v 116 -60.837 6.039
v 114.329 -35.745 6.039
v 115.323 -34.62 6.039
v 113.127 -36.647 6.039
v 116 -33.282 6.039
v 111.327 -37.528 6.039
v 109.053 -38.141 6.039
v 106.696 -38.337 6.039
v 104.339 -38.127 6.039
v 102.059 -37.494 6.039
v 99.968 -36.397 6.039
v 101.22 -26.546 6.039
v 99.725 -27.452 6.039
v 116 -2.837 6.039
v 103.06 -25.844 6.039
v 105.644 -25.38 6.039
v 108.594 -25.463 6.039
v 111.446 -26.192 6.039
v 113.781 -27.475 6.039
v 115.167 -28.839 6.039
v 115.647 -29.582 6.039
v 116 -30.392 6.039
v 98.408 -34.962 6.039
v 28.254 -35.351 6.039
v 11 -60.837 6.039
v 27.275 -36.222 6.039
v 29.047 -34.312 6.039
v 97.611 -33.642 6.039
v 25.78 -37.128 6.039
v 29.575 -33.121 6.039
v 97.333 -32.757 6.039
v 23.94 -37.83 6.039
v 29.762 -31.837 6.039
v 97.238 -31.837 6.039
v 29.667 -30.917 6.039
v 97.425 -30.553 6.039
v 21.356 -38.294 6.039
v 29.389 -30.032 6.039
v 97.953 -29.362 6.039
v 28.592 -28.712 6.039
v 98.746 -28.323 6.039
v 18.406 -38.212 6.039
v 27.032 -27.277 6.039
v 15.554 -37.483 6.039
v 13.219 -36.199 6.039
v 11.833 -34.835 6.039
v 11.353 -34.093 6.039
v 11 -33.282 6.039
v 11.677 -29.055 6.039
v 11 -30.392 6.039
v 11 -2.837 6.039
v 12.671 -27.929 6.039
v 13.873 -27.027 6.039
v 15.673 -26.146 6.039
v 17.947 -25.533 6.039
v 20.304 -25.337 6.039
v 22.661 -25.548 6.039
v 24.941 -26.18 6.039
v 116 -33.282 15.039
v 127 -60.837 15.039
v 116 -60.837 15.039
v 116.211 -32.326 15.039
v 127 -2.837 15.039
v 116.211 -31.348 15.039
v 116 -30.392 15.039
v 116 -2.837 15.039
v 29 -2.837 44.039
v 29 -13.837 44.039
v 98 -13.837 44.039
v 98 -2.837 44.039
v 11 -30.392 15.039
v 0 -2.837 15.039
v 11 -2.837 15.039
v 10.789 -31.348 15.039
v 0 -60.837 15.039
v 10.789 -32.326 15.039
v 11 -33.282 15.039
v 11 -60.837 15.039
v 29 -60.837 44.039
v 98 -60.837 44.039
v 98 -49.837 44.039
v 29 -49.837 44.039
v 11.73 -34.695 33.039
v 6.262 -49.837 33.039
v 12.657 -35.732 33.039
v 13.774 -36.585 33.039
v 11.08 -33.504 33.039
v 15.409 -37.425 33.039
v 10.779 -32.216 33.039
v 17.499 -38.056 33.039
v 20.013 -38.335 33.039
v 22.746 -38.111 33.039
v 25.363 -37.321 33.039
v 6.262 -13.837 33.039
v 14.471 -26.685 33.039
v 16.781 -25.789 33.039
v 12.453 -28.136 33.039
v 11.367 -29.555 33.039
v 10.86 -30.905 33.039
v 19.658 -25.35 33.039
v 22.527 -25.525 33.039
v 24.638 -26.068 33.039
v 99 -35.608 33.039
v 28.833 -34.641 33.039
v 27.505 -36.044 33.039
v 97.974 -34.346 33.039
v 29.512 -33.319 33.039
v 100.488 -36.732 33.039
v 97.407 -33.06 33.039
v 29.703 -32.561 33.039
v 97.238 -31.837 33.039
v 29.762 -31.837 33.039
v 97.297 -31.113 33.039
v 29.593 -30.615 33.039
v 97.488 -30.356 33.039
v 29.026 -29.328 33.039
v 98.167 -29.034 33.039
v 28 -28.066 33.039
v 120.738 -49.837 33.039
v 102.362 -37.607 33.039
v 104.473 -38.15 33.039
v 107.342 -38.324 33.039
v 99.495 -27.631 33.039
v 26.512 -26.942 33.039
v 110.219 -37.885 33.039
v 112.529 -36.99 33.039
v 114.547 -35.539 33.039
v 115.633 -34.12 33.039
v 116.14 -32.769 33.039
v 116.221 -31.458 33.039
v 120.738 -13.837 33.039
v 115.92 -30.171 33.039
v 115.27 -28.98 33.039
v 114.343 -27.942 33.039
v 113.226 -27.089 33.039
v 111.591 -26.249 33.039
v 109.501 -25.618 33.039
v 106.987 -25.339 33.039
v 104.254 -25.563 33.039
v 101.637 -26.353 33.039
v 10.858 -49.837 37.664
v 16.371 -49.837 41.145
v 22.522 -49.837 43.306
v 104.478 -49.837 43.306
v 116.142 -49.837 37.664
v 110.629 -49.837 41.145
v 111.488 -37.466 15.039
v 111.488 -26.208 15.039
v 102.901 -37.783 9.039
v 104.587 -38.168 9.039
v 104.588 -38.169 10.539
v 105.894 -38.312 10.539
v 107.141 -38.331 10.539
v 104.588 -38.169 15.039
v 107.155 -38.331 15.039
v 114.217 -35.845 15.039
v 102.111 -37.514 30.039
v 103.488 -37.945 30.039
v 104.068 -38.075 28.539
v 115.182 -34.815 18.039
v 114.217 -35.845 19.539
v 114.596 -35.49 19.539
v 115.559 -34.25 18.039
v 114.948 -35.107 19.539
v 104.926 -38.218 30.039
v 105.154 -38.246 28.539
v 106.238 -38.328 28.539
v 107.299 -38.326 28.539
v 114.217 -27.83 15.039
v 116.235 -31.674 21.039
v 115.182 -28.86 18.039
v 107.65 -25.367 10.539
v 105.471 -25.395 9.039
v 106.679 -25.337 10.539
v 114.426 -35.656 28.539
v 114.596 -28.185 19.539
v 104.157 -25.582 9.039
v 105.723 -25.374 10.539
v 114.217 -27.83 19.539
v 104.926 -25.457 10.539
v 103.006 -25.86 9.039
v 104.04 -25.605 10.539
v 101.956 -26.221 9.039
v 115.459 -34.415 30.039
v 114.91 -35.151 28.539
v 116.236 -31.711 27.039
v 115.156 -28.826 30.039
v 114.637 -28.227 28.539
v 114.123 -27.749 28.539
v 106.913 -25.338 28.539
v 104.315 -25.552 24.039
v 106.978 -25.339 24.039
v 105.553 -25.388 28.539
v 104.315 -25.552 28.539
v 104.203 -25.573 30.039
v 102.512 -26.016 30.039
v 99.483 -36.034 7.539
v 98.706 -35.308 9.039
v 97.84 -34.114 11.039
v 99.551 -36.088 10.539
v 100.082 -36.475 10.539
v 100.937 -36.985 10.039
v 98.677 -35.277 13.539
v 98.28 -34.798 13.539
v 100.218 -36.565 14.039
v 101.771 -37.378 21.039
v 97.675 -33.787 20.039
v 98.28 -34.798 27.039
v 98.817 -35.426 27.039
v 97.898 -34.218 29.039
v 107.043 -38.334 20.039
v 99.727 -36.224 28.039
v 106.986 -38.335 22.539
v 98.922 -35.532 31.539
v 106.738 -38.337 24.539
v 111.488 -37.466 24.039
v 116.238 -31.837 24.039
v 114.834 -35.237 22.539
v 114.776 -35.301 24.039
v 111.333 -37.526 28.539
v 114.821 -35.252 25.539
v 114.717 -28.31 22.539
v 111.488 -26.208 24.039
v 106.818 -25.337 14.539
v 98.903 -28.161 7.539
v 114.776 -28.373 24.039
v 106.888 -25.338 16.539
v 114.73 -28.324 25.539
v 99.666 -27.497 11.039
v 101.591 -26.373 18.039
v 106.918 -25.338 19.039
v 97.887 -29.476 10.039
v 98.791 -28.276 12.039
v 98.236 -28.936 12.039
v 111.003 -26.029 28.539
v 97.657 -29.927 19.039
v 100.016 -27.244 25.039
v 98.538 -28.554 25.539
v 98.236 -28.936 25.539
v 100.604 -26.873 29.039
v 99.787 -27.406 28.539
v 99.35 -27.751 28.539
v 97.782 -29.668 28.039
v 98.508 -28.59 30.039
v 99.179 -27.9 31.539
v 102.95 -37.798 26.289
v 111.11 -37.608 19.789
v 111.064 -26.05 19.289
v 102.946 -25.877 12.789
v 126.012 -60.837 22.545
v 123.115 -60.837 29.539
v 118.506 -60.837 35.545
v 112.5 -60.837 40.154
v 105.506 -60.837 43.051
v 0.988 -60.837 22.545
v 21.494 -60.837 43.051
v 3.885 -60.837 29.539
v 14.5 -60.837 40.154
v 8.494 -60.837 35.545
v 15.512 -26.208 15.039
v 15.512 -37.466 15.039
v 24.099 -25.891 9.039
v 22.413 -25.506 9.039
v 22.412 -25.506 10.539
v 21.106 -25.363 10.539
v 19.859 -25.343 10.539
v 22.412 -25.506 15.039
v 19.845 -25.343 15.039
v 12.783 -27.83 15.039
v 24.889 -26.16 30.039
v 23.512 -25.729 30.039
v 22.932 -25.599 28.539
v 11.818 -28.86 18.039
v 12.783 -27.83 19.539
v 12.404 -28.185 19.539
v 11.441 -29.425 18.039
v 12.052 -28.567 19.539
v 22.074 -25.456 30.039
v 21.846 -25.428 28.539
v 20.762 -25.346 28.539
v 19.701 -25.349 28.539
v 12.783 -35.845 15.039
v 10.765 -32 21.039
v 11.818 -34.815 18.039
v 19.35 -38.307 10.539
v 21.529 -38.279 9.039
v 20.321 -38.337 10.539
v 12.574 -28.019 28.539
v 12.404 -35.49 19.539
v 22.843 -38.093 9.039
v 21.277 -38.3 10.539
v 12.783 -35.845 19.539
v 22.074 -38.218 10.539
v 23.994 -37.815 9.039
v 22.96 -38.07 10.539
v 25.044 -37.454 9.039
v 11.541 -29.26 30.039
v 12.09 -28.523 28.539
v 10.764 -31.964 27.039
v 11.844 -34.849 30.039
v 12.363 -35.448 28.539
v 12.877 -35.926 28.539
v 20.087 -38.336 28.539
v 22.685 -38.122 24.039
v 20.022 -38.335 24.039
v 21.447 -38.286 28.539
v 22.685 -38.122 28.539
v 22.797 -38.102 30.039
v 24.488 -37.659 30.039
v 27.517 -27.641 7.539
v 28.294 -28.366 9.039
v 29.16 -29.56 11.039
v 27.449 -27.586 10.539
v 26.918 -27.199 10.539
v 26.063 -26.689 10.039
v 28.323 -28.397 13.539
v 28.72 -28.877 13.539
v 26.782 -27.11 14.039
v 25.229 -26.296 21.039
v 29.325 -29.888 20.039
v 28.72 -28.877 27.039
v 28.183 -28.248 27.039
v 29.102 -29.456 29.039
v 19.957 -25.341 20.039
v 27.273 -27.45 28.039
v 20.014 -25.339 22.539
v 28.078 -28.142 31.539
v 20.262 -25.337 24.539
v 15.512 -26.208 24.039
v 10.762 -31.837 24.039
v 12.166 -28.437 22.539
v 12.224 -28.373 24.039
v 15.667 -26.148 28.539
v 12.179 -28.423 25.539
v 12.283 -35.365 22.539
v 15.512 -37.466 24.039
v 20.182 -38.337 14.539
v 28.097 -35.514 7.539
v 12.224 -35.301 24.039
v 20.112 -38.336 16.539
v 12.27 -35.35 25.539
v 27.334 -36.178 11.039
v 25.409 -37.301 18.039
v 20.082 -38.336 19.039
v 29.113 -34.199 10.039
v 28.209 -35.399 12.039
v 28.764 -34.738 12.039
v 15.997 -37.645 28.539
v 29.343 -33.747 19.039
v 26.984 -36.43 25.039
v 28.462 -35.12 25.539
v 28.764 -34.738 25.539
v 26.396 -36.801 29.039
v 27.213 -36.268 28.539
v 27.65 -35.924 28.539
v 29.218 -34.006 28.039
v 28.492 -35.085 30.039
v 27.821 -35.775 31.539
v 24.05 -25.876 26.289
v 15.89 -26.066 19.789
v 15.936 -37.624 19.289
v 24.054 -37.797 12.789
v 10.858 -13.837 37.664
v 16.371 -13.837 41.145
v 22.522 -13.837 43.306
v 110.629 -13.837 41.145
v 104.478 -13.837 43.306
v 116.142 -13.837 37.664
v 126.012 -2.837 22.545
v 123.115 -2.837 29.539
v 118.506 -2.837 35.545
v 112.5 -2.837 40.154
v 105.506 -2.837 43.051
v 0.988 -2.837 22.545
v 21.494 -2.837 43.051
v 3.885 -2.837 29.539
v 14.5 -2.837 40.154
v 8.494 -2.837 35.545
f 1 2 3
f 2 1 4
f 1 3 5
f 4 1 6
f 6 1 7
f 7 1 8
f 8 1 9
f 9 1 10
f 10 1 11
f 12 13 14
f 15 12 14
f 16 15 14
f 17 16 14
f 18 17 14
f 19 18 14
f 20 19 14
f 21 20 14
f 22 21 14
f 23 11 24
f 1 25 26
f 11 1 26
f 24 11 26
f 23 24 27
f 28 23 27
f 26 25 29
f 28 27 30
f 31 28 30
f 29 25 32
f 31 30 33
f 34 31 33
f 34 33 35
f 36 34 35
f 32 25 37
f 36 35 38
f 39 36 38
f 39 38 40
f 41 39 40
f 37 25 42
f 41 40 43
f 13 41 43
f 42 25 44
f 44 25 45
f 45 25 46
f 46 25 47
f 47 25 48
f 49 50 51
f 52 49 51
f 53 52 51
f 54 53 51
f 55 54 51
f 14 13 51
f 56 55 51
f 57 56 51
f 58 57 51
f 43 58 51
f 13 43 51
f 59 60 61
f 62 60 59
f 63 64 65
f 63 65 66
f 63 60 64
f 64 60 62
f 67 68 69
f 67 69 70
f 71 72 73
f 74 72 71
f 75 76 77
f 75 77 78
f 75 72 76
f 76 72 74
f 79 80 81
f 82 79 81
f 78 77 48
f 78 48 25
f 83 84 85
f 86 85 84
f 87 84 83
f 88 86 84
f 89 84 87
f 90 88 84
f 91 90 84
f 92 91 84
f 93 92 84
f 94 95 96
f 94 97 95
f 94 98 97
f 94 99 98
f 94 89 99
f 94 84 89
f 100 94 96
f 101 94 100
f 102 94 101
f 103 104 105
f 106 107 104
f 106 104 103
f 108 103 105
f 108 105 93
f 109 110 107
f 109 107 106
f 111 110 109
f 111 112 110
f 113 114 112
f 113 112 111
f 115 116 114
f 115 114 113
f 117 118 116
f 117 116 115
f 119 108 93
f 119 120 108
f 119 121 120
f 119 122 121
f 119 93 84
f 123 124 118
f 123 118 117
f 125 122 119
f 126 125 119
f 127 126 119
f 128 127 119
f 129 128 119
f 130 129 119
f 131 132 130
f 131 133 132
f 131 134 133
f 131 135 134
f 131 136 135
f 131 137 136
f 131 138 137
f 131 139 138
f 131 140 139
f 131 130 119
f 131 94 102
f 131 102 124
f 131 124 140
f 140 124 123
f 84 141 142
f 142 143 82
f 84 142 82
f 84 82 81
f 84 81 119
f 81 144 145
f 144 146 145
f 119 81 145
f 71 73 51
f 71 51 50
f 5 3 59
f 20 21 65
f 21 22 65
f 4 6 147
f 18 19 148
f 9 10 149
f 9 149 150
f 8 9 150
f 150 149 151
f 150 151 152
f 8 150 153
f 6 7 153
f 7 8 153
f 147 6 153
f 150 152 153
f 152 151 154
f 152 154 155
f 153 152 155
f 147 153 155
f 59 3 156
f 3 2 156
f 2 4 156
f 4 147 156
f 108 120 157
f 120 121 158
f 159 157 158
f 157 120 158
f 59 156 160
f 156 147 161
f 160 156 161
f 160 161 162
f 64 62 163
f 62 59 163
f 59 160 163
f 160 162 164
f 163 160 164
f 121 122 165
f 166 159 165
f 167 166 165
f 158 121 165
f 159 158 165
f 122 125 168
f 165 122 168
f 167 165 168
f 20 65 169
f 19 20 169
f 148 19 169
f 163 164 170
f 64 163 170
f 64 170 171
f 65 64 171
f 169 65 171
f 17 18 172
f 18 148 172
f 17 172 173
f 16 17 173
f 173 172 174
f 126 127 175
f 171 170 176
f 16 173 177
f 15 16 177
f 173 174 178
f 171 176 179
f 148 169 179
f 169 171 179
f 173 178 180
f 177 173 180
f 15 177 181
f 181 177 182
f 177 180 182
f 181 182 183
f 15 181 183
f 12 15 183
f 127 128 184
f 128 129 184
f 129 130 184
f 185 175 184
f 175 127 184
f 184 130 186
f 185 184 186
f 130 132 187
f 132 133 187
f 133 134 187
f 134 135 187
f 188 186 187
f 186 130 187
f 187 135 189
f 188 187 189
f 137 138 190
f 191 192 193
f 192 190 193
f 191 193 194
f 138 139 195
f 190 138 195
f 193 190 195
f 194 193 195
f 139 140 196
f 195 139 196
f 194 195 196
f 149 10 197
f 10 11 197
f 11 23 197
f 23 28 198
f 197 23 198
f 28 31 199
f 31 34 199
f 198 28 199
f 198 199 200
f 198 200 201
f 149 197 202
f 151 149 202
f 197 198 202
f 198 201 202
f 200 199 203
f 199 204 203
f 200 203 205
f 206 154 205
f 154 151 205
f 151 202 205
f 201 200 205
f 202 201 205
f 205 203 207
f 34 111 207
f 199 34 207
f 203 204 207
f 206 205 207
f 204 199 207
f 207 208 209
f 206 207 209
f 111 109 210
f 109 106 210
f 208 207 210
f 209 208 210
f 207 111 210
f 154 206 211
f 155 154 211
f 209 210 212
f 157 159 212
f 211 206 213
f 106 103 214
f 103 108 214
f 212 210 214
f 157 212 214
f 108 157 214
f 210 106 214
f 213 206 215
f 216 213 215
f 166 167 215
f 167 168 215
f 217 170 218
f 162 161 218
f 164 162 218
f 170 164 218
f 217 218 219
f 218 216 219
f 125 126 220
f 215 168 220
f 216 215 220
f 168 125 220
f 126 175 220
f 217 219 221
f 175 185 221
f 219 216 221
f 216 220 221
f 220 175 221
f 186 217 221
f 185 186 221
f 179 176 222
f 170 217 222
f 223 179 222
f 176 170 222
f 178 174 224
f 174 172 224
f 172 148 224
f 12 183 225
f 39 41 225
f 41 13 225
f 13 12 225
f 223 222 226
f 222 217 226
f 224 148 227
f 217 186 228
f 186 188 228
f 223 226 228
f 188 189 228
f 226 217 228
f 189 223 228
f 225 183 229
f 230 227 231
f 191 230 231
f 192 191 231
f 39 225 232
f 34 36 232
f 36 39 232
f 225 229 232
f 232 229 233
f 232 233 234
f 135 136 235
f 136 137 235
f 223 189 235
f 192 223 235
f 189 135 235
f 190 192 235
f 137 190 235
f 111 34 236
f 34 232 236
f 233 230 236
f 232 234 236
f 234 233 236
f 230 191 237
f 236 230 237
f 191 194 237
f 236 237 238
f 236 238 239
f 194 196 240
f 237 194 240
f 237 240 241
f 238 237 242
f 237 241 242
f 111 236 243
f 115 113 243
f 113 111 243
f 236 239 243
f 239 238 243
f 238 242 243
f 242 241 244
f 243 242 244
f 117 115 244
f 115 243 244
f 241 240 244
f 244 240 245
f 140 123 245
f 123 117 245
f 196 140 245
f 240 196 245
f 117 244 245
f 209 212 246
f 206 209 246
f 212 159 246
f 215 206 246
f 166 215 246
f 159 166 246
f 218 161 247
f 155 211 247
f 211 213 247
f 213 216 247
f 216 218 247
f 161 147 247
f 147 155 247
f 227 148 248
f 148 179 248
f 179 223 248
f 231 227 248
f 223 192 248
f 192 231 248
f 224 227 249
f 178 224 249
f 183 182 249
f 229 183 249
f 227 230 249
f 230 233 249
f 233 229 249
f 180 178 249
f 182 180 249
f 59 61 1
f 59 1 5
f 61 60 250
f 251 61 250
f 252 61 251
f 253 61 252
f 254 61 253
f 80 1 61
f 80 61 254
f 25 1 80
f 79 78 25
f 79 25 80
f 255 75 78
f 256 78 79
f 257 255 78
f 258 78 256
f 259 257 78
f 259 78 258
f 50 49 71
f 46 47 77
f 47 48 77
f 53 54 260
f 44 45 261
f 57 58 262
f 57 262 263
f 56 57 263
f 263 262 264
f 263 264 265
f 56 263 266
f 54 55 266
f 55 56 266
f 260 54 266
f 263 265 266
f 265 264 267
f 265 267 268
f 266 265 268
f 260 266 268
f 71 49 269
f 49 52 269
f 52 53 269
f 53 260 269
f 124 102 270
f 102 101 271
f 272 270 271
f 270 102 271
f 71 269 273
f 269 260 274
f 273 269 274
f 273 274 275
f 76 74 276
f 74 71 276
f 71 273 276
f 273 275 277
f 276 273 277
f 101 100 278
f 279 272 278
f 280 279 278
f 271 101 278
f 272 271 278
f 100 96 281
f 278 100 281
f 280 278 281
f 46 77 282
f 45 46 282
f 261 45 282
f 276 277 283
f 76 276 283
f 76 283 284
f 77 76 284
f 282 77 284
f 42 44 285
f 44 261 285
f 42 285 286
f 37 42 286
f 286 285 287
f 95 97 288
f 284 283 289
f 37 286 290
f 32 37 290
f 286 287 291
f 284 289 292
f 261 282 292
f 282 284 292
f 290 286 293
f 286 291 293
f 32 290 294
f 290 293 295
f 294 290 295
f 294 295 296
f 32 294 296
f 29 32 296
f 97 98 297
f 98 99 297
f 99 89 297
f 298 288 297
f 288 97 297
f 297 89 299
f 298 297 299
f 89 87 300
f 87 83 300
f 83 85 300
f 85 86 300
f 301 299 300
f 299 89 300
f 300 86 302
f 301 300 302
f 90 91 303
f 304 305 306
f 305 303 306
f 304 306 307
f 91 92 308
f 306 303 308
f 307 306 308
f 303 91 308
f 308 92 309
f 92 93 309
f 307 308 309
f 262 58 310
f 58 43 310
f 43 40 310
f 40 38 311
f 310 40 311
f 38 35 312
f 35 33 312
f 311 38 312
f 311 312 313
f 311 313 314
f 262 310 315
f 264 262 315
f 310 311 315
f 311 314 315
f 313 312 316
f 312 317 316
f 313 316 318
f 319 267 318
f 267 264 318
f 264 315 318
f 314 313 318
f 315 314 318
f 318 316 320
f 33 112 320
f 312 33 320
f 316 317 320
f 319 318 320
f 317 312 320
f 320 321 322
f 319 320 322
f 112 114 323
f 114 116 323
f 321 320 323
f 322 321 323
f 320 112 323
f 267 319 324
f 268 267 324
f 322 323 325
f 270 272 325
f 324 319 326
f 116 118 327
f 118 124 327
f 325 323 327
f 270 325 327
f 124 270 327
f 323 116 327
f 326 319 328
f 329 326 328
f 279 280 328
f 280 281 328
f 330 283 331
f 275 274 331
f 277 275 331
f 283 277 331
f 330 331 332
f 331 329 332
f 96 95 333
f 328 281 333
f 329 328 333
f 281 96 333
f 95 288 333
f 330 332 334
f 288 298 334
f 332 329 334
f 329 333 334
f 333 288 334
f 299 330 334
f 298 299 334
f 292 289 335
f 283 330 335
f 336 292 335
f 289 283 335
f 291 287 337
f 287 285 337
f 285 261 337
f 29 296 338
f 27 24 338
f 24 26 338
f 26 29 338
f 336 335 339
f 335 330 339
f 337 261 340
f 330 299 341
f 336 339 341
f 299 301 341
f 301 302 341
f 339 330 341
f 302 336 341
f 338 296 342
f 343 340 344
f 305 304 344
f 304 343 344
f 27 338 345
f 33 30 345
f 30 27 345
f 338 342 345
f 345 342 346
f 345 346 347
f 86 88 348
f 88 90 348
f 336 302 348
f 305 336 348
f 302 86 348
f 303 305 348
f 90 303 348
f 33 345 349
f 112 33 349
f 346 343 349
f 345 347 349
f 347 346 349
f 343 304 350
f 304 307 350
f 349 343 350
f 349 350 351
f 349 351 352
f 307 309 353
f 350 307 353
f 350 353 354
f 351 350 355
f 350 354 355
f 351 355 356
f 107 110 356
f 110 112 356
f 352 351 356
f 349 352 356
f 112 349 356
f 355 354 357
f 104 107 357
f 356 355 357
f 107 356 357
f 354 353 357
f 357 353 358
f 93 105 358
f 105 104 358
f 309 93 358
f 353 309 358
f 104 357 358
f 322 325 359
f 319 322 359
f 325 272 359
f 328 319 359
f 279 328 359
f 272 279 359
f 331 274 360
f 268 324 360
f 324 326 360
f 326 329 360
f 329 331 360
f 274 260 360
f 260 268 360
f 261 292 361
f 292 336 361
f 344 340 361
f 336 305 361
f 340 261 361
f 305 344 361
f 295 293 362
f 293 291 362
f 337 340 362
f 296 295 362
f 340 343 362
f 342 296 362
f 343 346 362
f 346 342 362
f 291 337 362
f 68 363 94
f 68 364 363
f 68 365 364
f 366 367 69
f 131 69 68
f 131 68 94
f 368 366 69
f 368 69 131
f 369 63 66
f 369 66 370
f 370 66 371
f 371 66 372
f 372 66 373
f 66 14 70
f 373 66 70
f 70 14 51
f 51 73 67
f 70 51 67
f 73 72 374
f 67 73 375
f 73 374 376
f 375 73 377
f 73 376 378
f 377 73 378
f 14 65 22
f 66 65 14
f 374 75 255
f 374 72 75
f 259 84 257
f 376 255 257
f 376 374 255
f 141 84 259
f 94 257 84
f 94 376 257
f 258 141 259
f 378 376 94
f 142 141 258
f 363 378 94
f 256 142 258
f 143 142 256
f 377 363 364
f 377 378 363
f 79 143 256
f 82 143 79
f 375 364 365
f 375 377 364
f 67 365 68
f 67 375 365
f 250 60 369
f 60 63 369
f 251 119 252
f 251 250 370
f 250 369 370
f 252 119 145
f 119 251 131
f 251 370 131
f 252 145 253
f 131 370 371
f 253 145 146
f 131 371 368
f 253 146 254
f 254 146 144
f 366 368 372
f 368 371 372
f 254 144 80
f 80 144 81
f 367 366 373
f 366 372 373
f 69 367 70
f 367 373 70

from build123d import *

# Parameters (mm, degrees)
F0_W      = 58
F0_H      = 38
F1_DEPTH  = 127
F2_W      = 58
F2_H      = 9
F3_DEPTH  = 11
F4_W      = 58
F4_H      = 9
F5_DEPTH  = 11
F6_W      = 127
F6_H      = 36
F7_DEPTH  = 11
F8_F1_R   = 28.9999
F8_F2_R   = 28.9999
F12_DEPTH = 38


# Not quite as in the source:
# - a fillet or chamfer is up to 0.001 mm smaller than in the source, because OpenCascade refuses the exact size


with BuildPart() as f1:
    # F0 (on Right) → F1 (new body)
    with BuildSketch(Plane.YZ):
        with Locations((-31.8372100785, 25.0391024165)):
            Rectangle(F0_W, F0_H)
    extrude(amount=F1_DEPTH)

    # F2 (on face) → F3 (cut)
    with BuildSketch(Plane.YZ.offset(127)):
        with Locations((-31.8372100785, 10.5391024165)):
            Rectangle(F2_W, F2_H)
    extrude(amount=-F3_DEPTH, mode=Mode.SUBTRACT)

    # F4 (on face) → F5 (cut)
    with BuildSketch(Plane(origin=(0, 0, 0), x_dir=(0, -1, 0), z_dir=(-1, 0, 0))):
        with Locations((31.8372100785, 10.5391024165)):
            Rectangle(F4_W, F4_H)
    extrude(amount=-F5_DEPTH, mode=Mode.SUBTRACT)

    # F6 (on face) → F7 (cut)
    with BuildSketch(Plane.XY.offset(44.0391024165)):
        with Locations((63.5, -31.8372100785)):
            Rectangle(F6_W, F6_H)
    extrude(amount=-F7_DEPTH, mode=Mode.SUBTRACT)

    # F8: fillet of radius 29 on 4 edges, made by hand

    # F8_f1 (radius 29 in the source; OpenCascade refuses exactly that, so slightly less here)
    f8_f1_edges = [f1.edges().sort_by_distance(p)[0] for p in [
        (0, -8.3372100785, 44.0391024165),
    ]]
    fillet(f8_f1_edges, radius=F8_F1_R)

    # F8_f2 (radius 29 in the source; OpenCascade refuses exactly that, so slightly less here)
    f8_f2_edges = [f1.edges().sort_by_distance(p)[0] for p in [
        (127, -8.3372100785, 44.0391024165),
    ]]
    fillet(f8_f2_edges, radius=F8_F2_R)

    # F11 (on face) → F12 (cut)
    with BuildSketch(Plane.XY.offset(33.0391024165)):
        with BuildLine():
            add(Edge.make_bspline(
                [(29.7623659982, -31.8372100785), (29.7623659982, -20.5788798293), (15.5123659982, -26.2080449539), (1.2623659982, -31.8372100785), (15.5123659982, -37.4663752031), (29.7623659982, -43.0955403277), (29.7623659982, -31.8372100785)],
                knots=[0, 0, 0, 2.0943951024, 2.0943951024, 4.1887902048, 4.1887902048, 6.2831853072, 6.2831853072, 6.2831853072], degree=2, weights=[1, 0.5, 1, 0.5, 1, 0.5, 1]))
        make_face()
        with BuildLine():
            add(Edge.make_bspline(
                [(97.2376340018, -31.8372100785), (97.2376340018, -43.0955403277), (111.4876340018, -37.4663752031), (125.7376340018, -31.8372100785), (111.4876340018, -26.2080449539), (97.2376340018, -20.5788798293), (97.2376340018, -31.8372100785)],
                knots=[0, 0, 0, 2.0943951024, 2.0943951024, 4.1887902048, 4.1887902048, 6.2831853072, 6.2831853072, 6.2831853072], degree=2, weights=[1, 0.5, 1, 0.5, 1, 0.5, 1]))
        make_face()
    extrude(amount=-F12_DEPTH, mode=Mode.SUBTRACT)


solid = f1.part
